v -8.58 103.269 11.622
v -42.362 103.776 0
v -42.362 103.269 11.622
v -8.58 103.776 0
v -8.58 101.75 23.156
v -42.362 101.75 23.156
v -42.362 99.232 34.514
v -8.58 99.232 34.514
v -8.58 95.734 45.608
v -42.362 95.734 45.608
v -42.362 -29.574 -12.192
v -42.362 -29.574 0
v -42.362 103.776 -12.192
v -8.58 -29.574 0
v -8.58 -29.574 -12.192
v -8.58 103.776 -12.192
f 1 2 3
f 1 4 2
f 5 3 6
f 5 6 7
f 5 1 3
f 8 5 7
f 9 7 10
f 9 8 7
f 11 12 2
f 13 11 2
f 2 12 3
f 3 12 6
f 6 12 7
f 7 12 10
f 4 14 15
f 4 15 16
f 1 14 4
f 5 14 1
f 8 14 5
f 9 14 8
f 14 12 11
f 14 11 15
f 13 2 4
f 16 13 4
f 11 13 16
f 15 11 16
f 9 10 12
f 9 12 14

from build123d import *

# Parameters (mm, degrees)
F0_W     = 33.782
F0_H     = 133.35
F1_ANGLE = 20
F2_DEPTH = 12.192


with BuildPart() as f1:
    # F0 (on Top) → F1 (revolve)
    with BuildSketch(Plane.XY):
        with Locations((-25.47081, 37.101181)):
            Rectangle(F0_W, F0_H)
    revolve(axis=Axis((-25.47081, -29.573819, 0), (1, 0, 0)), revolution_arc=F1_ANGLE)

    # F0 (on Top) → F2 (join)
    with BuildSketch(Plane.XY):
        with Locations((-25.47081, 37.101181)):
            Rectangle(F0_W, F0_H)
    extrude(amount=-F2_DEPTH)


solid = f1.part
